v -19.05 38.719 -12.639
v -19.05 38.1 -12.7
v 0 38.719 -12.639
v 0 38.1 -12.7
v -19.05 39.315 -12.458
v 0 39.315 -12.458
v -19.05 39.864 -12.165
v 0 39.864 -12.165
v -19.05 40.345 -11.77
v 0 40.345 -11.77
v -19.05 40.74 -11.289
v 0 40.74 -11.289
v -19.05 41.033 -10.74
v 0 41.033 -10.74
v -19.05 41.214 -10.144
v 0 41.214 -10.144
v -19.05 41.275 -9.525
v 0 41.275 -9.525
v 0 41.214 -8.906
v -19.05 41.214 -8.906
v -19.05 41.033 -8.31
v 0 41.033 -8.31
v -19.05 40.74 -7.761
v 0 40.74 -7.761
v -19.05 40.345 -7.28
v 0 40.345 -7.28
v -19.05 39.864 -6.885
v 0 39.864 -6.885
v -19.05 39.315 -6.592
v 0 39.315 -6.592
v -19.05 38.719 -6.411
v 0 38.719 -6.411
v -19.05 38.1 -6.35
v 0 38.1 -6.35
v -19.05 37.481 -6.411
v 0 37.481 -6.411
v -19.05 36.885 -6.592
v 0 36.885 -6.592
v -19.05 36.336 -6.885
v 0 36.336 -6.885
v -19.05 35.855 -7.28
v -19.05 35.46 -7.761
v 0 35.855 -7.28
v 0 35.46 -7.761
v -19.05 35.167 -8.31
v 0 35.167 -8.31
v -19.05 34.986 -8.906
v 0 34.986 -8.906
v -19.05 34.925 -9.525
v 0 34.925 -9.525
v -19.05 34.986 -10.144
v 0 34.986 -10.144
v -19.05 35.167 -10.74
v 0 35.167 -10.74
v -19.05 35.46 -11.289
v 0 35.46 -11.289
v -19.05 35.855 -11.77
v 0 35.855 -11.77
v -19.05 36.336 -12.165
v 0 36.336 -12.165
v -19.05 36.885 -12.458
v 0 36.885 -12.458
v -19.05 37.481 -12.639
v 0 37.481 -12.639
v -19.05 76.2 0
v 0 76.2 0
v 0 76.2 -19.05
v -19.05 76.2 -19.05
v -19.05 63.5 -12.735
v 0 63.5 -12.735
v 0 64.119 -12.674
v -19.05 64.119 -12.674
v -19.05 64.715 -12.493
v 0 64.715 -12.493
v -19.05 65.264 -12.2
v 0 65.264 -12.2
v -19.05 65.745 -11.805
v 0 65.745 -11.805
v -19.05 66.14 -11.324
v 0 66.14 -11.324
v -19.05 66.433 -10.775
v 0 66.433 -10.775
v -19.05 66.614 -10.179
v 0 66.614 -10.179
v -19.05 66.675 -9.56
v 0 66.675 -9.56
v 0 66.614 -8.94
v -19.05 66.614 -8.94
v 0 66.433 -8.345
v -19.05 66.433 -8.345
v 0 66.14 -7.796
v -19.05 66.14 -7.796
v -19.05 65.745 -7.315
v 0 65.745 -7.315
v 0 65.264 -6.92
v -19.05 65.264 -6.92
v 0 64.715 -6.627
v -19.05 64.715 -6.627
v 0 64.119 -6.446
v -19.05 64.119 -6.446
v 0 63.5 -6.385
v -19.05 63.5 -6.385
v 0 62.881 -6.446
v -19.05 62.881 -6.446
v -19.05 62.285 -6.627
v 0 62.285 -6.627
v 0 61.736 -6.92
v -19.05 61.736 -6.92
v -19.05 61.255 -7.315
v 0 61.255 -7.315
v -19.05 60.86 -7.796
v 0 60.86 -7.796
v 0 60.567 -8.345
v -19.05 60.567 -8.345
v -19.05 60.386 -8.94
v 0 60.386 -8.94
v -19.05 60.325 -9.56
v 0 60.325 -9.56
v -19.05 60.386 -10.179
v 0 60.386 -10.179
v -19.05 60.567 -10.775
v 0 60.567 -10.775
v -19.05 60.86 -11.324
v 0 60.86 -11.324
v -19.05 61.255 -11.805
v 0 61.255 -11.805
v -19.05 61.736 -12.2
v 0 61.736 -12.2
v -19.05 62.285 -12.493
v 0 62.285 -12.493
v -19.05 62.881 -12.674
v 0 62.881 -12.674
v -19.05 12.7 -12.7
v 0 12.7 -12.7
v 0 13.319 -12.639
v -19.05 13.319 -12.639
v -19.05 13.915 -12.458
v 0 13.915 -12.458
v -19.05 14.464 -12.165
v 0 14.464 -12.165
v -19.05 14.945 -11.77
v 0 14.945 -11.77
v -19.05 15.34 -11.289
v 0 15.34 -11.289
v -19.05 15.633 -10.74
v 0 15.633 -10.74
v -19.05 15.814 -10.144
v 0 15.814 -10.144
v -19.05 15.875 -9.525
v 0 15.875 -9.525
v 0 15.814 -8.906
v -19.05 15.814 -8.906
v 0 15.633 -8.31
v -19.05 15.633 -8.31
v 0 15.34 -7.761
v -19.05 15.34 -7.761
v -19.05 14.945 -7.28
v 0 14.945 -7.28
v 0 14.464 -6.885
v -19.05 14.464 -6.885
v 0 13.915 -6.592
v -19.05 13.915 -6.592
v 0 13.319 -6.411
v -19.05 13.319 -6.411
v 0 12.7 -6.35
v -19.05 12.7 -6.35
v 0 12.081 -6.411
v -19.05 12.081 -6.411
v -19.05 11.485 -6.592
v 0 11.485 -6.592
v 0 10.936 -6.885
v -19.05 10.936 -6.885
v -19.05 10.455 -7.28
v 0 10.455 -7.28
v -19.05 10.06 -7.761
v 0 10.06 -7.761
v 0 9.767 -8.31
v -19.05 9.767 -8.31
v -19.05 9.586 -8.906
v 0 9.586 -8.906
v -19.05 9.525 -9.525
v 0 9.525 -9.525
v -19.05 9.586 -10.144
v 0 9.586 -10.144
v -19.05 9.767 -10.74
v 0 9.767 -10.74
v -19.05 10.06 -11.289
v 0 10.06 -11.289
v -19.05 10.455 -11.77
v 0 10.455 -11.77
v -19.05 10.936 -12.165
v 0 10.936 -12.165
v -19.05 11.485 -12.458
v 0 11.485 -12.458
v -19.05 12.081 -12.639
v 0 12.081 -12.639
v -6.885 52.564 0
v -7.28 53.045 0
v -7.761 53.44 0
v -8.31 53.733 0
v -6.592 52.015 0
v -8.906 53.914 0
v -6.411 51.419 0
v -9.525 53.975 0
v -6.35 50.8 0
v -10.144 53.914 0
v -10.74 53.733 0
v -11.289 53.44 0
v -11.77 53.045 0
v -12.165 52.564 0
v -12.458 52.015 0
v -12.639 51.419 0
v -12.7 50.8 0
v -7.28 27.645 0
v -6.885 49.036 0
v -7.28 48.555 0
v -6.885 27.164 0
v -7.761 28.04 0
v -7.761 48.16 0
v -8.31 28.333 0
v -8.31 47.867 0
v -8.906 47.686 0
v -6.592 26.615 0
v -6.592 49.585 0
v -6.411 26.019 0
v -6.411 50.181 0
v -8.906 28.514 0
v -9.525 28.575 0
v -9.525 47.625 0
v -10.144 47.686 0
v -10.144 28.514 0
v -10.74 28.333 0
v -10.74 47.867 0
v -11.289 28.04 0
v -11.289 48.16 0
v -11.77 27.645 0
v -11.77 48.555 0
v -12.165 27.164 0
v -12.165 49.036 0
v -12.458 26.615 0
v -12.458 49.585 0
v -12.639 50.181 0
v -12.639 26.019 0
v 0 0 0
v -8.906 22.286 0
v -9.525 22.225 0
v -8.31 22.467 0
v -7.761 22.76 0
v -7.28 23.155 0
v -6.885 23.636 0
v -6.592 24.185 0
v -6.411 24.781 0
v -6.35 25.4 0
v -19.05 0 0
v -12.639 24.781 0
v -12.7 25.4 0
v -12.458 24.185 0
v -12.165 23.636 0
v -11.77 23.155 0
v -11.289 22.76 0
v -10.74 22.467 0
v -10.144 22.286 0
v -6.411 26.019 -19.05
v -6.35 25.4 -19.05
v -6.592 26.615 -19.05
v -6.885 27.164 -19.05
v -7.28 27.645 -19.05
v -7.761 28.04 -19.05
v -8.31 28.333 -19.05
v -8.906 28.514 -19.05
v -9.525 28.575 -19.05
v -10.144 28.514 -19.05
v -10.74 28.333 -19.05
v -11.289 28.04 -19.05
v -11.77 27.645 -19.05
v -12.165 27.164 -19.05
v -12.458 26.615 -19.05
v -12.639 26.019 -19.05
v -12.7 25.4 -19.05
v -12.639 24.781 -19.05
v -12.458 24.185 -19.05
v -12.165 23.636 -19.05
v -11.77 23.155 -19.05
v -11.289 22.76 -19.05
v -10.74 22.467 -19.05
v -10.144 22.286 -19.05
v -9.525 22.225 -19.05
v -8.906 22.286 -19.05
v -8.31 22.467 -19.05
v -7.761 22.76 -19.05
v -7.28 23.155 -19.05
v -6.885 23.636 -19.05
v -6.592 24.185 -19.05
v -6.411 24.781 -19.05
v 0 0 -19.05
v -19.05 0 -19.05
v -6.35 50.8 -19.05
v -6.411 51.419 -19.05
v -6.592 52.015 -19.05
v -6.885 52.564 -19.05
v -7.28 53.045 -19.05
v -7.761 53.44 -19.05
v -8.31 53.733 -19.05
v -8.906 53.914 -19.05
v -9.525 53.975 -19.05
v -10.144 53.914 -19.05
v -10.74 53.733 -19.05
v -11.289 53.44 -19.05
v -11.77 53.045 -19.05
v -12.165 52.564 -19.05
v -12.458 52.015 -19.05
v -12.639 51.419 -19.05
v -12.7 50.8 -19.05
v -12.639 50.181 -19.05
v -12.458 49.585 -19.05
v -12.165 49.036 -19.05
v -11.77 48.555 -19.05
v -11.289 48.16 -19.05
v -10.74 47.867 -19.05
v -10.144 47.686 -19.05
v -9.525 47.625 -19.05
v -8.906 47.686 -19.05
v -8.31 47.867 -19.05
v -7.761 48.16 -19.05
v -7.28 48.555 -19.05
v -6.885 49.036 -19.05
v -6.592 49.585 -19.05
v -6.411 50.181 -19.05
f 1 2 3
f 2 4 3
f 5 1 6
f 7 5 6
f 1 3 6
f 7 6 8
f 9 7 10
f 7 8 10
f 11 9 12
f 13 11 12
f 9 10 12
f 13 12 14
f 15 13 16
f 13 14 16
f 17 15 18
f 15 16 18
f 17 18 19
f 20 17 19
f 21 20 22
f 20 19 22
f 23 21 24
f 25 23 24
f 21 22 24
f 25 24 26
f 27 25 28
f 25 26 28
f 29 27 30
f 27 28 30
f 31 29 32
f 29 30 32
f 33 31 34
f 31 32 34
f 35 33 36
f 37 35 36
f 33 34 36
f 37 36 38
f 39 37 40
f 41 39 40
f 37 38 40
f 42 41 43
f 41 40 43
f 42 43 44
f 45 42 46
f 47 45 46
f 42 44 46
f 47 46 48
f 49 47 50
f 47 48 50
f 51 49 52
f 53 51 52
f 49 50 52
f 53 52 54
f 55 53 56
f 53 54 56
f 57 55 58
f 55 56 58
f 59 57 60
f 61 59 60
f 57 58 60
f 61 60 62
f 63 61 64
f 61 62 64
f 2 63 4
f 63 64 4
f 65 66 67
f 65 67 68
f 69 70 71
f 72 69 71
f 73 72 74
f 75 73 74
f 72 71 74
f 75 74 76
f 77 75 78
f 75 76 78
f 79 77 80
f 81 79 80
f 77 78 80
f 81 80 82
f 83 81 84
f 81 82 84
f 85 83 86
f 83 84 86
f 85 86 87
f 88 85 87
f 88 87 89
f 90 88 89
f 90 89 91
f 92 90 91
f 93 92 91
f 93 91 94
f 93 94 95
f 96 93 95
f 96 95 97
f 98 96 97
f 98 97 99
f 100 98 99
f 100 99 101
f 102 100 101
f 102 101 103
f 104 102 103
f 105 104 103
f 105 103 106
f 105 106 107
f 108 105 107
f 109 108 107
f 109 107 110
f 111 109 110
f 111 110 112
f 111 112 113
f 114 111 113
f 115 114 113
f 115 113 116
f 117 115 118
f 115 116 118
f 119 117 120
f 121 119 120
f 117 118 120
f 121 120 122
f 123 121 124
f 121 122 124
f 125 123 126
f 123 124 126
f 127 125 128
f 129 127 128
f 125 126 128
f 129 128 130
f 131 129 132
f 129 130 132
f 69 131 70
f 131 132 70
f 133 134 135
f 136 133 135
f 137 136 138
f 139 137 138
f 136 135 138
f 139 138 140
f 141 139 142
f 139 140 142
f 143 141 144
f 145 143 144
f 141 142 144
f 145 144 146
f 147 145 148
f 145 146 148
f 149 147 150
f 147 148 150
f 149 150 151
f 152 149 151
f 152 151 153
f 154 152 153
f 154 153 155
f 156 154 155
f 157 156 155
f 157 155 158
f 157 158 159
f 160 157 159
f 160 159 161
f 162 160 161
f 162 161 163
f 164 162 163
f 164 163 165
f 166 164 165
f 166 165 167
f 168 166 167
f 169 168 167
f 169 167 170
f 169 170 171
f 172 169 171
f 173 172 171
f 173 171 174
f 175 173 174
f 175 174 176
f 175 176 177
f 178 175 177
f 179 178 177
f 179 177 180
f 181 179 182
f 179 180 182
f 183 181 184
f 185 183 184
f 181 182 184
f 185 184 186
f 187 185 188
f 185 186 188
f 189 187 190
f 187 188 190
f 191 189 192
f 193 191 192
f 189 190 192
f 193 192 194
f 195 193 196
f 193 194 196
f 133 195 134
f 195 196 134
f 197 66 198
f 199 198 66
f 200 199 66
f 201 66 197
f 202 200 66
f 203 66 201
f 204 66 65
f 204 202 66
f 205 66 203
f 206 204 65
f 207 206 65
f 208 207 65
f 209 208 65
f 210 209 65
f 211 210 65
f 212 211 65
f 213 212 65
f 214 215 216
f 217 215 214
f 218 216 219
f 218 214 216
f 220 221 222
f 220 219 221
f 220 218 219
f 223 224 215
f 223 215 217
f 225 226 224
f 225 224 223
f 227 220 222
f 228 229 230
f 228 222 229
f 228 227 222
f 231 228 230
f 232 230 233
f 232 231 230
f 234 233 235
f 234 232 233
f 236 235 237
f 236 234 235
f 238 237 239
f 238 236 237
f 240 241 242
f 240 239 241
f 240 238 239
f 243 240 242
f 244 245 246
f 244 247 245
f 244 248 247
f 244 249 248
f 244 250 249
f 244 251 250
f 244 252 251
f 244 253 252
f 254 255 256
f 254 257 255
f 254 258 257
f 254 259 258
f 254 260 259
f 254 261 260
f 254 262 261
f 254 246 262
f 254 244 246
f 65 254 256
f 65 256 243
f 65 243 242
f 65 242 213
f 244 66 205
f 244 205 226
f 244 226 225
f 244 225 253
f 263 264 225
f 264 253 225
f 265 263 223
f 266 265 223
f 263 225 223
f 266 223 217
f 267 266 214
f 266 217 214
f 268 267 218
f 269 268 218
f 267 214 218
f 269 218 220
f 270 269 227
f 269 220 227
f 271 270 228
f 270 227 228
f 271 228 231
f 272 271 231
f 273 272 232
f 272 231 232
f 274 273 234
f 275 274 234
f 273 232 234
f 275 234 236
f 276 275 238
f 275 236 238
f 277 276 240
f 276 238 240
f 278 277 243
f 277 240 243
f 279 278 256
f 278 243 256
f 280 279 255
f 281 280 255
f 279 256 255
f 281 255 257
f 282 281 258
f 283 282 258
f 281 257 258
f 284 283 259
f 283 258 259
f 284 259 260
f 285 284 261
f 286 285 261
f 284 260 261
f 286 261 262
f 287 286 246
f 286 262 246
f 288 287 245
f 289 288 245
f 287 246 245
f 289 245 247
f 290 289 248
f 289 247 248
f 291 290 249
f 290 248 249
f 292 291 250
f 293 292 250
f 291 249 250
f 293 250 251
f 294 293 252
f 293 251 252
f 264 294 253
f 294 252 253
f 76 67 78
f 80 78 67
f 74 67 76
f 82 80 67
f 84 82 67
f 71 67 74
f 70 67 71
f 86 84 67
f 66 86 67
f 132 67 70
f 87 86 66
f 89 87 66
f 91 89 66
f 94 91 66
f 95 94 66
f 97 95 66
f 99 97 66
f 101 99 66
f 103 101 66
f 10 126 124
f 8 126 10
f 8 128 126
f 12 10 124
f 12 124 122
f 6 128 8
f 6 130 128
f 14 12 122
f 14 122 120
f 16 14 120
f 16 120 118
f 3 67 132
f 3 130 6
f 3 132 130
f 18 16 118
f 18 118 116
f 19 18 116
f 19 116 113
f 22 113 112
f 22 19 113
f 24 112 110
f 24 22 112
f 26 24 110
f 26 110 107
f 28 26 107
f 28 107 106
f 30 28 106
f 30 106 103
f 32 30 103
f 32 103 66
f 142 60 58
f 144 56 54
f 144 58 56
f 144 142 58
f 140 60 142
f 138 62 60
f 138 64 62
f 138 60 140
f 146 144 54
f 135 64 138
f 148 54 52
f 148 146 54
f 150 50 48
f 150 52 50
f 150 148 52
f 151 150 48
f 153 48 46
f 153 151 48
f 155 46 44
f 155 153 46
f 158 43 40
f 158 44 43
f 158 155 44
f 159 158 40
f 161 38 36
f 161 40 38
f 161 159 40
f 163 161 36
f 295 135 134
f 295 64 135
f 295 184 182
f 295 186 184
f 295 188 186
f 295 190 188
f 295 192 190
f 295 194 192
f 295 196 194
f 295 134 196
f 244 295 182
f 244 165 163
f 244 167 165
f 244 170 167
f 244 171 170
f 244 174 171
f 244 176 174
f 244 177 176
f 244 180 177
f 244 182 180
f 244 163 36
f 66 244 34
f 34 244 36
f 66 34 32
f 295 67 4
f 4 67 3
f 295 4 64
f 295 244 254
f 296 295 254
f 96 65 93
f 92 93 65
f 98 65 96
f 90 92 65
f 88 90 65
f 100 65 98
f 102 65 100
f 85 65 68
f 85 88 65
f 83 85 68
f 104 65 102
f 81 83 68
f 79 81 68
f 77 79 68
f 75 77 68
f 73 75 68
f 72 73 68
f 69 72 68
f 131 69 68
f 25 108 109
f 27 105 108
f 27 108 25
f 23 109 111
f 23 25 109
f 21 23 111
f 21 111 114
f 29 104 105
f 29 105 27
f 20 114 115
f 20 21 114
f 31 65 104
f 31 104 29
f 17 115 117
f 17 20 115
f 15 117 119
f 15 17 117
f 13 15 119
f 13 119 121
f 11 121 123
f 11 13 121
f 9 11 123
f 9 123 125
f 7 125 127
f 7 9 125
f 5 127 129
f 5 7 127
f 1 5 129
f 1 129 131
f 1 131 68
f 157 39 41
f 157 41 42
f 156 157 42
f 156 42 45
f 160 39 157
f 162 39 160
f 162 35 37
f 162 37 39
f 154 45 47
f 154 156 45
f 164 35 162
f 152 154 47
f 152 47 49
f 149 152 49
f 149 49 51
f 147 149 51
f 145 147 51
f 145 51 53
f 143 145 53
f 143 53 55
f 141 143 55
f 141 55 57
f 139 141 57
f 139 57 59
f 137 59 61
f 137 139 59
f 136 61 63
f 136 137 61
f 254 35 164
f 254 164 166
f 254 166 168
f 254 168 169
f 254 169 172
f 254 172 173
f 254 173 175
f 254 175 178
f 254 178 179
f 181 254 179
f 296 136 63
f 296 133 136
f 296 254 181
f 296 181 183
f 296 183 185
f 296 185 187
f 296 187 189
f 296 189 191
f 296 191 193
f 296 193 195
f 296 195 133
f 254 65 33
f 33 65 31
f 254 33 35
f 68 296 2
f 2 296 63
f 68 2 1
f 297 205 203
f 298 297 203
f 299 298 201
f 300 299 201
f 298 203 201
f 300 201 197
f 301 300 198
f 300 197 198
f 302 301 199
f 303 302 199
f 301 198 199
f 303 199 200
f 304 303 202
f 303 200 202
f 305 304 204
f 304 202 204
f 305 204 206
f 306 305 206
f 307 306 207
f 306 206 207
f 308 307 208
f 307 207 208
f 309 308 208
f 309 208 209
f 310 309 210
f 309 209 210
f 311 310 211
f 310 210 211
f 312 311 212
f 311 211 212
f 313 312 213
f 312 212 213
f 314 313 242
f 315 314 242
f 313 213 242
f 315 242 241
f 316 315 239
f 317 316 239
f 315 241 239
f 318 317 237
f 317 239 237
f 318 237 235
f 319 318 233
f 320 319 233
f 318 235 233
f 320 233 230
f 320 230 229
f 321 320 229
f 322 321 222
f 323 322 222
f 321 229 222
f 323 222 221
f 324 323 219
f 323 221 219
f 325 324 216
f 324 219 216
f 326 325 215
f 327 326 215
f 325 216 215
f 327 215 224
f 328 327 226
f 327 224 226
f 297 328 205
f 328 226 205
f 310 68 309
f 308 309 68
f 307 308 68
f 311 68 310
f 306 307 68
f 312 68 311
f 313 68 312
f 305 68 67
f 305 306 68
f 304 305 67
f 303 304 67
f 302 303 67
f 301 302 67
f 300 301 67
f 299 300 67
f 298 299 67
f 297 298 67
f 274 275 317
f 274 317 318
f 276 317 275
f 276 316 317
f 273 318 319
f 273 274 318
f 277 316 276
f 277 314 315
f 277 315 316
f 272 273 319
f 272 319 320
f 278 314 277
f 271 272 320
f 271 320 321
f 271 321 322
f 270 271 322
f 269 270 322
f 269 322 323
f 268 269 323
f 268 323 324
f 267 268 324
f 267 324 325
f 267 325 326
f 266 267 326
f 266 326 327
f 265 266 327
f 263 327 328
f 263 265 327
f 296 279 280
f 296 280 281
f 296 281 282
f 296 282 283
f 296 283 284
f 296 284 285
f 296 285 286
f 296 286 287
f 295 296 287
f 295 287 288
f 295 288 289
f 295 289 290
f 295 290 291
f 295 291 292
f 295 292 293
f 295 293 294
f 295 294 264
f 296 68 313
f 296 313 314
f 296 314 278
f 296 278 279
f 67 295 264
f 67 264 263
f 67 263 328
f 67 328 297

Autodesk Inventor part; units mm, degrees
ref_plane "YZ Plane" through (0, 0, 0) normal (1, 0, 0) x (0, 1, 0)
ref_plane "XZ Plane" through (0, 0, 0) normal (0, 1, 0) x (-1, 0, 0)
ref_plane "XY Plane" through (0, 0, 0) normal (0, 0, 1) x (1, 0, 0)
sketch "Sketch1" plane through (0, 0, 0) normal (0, 1, 0) x (-1, 0, 0)
  line L0 (0, 0) -> (19.05, 0)
  line L1 (19.05, 0) -> (19.05, -19.05)
  line L2 (19.05, -19.05) -> (0, -19.05)
  line L3 (0, -19.05) -> (0, 0)
  dimension "d0" = 19.05
  dimension "d1" = 19.05
extrude "Extrusion1" add sketch "Sketch1" along normal blind 76.2
sketch "Sketch4" plane through (-19.05, 0, 0) normal (0, 0, 1) x (1, 0, 0)
  circle A0 centre (9.525, 50.8) radius 3.175
  line L0 (0, 76.2) -> (19.05, 76.2) projected
  line L1 (19.05, 0) -> (19.05, 76.2) projected
  circle A1 centre (9.525, 25.4) radius 3.175
  line L2 (0, 0) -> (19.05, 0) projected
  dimension "d19" = 6.35
  dimension "d20" = 25.4
  dimension "d21" = 9.525
  dimension "d22" = 6.35
  dimension "d23" = 9.525
  dimension "d24" = 25.4
extrude "Extrusion4" cut sketch "Sketch4" against normal blind 25.4
sketch "Sketch5" plane through (0, 0, 0) normal (1, 0, 0) x (0, 0, -1)
  circle A0 centre (9.5599, 63.5) radius 3.175
  line L0 (0, 76.2) -> (19.05, 76.2) projected
  circle A1 centre (9.525, 38.1) radius 3.175
  line L1 (19.05, 0) -> (19.05, 76.2) projected
  circle A2 centre (9.525, 12.7) radius 3.175
  line L2 (0, 0) -> (19.05, 0) projected
  line L3 (0, 0) -> (0, 76.2) projected
  dimension "d27" = 6.35
  dimension "d28" = 12.7
  dimension "d29" = 6.35
  dimension "d30" = 9.525
  dimension "d31" = 38.1
  dimension "d32" = 6.35
  dimension "d33" = 12.7
  dimension "d34" = 9.525
extrude "Extrusion5" cut sketch "Sketch5" against normal blind 25.4 contours A0 | A1 | A2
properties part number "Experimental Block Bracket" material "Aluminum 6061"
